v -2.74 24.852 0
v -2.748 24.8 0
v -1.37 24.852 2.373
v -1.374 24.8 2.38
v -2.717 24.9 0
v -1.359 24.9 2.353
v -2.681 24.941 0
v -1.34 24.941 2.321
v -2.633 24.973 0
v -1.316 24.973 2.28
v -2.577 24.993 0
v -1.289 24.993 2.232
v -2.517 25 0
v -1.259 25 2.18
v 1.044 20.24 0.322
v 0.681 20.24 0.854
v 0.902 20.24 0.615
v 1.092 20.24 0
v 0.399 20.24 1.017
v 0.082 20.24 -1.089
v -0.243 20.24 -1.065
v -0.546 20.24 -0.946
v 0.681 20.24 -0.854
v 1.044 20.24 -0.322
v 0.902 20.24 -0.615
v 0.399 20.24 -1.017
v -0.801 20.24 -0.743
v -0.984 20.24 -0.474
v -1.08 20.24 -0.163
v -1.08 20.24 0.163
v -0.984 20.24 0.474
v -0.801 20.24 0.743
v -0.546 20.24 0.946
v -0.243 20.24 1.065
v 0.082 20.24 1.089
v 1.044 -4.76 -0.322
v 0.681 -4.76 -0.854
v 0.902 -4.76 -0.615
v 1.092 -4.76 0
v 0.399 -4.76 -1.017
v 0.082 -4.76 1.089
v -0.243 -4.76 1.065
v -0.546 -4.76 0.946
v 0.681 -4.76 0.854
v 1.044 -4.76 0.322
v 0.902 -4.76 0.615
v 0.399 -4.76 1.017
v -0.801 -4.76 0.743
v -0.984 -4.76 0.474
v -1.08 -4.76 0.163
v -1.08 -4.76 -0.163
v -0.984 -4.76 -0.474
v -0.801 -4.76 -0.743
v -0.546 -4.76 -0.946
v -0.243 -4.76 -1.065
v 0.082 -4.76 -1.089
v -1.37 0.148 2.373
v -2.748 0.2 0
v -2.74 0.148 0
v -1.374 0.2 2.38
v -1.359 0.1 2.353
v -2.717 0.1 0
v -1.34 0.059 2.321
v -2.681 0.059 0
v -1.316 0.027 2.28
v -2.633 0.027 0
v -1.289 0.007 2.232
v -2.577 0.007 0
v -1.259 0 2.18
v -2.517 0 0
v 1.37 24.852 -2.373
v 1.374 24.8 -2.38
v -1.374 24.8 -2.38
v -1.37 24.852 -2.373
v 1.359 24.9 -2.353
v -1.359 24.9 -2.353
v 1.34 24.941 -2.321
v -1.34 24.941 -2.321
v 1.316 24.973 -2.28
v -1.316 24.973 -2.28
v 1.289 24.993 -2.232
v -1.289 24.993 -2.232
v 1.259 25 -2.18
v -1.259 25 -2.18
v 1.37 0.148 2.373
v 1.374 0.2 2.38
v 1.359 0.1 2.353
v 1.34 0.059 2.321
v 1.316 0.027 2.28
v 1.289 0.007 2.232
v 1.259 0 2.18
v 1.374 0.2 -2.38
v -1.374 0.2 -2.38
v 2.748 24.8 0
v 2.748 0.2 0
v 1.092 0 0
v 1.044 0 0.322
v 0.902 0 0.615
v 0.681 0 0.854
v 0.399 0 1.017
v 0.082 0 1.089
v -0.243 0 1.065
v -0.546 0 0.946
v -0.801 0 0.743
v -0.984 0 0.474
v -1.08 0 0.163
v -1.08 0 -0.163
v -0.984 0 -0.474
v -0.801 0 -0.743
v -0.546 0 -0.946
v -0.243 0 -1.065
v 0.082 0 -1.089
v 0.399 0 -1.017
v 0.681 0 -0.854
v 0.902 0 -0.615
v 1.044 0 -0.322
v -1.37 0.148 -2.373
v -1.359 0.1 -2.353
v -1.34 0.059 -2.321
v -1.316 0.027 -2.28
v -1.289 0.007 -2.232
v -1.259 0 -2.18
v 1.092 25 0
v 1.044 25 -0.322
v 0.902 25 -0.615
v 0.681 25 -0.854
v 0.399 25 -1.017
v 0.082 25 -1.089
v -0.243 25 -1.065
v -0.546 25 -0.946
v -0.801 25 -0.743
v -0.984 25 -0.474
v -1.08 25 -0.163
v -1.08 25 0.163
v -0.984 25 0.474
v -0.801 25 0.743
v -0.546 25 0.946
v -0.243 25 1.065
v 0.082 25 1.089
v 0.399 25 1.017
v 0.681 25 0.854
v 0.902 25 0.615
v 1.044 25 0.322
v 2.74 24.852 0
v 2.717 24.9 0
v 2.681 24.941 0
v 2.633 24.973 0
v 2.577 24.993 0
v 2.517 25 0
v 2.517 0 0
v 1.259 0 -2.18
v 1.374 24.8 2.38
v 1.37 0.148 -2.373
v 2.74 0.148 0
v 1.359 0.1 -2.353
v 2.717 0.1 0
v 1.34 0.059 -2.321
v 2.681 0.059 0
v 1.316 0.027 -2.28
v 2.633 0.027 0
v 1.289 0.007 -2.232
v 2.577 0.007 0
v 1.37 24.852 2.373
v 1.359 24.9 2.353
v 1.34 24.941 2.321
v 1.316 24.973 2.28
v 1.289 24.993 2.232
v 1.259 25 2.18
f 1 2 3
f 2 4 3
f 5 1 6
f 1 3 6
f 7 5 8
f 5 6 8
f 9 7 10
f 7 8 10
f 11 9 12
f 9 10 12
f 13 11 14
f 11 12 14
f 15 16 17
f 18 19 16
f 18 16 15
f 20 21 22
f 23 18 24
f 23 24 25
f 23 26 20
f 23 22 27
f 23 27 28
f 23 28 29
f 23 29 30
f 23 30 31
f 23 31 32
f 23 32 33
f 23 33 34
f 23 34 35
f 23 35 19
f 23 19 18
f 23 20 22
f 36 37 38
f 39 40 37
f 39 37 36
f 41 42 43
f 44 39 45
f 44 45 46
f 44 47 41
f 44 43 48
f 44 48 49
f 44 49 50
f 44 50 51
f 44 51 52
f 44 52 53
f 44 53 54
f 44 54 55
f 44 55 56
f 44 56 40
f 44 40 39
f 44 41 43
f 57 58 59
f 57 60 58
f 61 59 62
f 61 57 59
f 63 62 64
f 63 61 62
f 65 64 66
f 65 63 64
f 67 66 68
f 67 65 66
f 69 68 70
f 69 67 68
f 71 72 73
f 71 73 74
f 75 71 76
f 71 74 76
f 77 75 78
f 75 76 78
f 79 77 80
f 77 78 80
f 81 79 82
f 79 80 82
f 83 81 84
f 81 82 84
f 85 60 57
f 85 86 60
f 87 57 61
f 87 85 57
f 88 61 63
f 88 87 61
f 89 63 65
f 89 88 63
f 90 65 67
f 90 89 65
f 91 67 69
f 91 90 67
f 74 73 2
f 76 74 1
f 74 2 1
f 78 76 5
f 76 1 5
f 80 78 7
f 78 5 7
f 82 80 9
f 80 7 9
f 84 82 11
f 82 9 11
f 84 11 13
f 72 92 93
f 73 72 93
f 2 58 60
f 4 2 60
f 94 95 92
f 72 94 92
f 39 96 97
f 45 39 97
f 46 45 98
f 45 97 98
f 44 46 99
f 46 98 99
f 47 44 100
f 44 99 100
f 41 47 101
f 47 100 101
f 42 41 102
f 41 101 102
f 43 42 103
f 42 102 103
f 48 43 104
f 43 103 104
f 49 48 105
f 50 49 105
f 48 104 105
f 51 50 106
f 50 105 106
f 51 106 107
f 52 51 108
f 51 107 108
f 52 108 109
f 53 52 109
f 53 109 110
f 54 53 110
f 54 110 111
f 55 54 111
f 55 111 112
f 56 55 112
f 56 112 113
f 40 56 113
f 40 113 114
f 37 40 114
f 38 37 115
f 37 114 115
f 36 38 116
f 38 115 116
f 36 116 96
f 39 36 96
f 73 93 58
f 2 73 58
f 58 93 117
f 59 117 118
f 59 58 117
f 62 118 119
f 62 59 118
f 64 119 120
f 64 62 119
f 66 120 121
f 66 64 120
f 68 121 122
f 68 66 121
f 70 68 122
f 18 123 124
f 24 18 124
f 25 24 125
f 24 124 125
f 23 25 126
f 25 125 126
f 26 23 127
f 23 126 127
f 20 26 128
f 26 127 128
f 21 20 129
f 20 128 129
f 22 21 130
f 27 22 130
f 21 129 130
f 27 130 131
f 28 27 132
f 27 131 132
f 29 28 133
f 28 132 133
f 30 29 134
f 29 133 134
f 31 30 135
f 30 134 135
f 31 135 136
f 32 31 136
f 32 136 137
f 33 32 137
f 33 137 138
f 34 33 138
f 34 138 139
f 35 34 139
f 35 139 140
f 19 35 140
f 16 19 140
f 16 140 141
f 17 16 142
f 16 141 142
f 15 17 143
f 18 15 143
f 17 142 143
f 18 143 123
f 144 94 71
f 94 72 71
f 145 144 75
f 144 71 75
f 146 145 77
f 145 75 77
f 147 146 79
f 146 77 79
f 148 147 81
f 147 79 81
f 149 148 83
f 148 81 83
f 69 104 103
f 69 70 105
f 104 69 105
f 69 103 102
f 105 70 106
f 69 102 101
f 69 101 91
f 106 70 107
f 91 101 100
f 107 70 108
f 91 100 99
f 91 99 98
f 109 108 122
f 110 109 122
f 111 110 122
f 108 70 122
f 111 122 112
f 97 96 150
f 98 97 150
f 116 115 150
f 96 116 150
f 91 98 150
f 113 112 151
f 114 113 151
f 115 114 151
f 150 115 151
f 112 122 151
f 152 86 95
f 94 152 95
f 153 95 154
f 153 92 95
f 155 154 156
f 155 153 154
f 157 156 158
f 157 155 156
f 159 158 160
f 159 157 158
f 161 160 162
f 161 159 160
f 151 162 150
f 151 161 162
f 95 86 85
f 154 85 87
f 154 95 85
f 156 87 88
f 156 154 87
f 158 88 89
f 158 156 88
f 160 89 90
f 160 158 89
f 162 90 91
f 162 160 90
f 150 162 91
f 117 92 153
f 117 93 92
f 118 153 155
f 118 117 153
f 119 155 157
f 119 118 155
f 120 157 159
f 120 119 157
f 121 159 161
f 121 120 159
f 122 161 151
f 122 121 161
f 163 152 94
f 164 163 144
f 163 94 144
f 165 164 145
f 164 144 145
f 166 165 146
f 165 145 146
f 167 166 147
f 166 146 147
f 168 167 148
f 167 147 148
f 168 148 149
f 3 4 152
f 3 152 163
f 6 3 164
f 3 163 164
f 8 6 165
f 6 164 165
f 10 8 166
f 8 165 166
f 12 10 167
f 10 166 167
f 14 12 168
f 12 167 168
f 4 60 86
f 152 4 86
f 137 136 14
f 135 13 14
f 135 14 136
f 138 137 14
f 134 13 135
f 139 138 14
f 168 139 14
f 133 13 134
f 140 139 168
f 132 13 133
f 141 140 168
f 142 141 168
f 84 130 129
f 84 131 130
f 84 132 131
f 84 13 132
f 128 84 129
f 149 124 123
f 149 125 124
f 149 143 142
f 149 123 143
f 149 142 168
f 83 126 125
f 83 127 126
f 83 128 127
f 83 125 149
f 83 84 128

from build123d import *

# Parameters (mm, degrees)
RESSALTO_EXTRUS_O1_DEPTH = 25
FILETE1_R                = 0.2
ESBO_O2_R                = 1.0922
RESSALTO_EXTRUS_O2_DEPTH = 4.76
ESBO_O3_R                = 1.0922
CORTE_EXTRUS_O1_DEPTH    = 4.76


with BuildPart() as part:
    # Esboço1 → Ressalto-extrusão1 (new body)
    with BuildSketch(Plane(origin=(0, 0, 0), x_dir=(1, 0, 0), z_dir=(0, 1, 0))):
        Polygon((2.748187281, 0), (1.374093641, 2.38), (-1.374093641, 2.38), (-2.748187281, 0), (-1.374093641, -2.38), (1.374093641, -2.38), align=None)
    extrude(amount=RESSALTO_EXTRUS_O1_DEPTH)

    # Filete1
    filete1_edges = [part.edges().sort_by_distance(p)[0] for p in [
        (0, 25, -2.38),
        (-2.061140461, 25, -1.19),
        (-2.061140461, 25, 1.19),
        (0, 25, 2.38),
        (2.061140461, 25, 1.19),
        (0, 0, 2.38),
        (-2.061140461, 0, 1.19),
        (-2.061140461, 0, -1.19),
        (2.061140461, 25, -1.19),
        (0, 0, -2.38),
        (2.061140461, 0, -1.19),
        (2.061140461, 0, 1.19),
    ]]
    fillet(filete1_edges, radius=FILETE1_R)

    # Esboço2 → Ressalto-extrusão2 (add)
    with BuildSketch(Plane.XZ):
        Circle(ESBO_O2_R)
    extrude(amount=RESSALTO_EXTRUS_O2_DEPTH)

    # Esboço3 → Corte-extrusão1 (cut)
    with BuildSketch(Plane(origin=(0, 25, 0), x_dir=(1, 0, 0), z_dir=(0, 1, 0))):
        Circle(ESBO_O3_R)
    extrude(amount=-CORTE_EXTRUS_O1_DEPTH, mode=Mode.SUBTRACT)


solid = part.part
